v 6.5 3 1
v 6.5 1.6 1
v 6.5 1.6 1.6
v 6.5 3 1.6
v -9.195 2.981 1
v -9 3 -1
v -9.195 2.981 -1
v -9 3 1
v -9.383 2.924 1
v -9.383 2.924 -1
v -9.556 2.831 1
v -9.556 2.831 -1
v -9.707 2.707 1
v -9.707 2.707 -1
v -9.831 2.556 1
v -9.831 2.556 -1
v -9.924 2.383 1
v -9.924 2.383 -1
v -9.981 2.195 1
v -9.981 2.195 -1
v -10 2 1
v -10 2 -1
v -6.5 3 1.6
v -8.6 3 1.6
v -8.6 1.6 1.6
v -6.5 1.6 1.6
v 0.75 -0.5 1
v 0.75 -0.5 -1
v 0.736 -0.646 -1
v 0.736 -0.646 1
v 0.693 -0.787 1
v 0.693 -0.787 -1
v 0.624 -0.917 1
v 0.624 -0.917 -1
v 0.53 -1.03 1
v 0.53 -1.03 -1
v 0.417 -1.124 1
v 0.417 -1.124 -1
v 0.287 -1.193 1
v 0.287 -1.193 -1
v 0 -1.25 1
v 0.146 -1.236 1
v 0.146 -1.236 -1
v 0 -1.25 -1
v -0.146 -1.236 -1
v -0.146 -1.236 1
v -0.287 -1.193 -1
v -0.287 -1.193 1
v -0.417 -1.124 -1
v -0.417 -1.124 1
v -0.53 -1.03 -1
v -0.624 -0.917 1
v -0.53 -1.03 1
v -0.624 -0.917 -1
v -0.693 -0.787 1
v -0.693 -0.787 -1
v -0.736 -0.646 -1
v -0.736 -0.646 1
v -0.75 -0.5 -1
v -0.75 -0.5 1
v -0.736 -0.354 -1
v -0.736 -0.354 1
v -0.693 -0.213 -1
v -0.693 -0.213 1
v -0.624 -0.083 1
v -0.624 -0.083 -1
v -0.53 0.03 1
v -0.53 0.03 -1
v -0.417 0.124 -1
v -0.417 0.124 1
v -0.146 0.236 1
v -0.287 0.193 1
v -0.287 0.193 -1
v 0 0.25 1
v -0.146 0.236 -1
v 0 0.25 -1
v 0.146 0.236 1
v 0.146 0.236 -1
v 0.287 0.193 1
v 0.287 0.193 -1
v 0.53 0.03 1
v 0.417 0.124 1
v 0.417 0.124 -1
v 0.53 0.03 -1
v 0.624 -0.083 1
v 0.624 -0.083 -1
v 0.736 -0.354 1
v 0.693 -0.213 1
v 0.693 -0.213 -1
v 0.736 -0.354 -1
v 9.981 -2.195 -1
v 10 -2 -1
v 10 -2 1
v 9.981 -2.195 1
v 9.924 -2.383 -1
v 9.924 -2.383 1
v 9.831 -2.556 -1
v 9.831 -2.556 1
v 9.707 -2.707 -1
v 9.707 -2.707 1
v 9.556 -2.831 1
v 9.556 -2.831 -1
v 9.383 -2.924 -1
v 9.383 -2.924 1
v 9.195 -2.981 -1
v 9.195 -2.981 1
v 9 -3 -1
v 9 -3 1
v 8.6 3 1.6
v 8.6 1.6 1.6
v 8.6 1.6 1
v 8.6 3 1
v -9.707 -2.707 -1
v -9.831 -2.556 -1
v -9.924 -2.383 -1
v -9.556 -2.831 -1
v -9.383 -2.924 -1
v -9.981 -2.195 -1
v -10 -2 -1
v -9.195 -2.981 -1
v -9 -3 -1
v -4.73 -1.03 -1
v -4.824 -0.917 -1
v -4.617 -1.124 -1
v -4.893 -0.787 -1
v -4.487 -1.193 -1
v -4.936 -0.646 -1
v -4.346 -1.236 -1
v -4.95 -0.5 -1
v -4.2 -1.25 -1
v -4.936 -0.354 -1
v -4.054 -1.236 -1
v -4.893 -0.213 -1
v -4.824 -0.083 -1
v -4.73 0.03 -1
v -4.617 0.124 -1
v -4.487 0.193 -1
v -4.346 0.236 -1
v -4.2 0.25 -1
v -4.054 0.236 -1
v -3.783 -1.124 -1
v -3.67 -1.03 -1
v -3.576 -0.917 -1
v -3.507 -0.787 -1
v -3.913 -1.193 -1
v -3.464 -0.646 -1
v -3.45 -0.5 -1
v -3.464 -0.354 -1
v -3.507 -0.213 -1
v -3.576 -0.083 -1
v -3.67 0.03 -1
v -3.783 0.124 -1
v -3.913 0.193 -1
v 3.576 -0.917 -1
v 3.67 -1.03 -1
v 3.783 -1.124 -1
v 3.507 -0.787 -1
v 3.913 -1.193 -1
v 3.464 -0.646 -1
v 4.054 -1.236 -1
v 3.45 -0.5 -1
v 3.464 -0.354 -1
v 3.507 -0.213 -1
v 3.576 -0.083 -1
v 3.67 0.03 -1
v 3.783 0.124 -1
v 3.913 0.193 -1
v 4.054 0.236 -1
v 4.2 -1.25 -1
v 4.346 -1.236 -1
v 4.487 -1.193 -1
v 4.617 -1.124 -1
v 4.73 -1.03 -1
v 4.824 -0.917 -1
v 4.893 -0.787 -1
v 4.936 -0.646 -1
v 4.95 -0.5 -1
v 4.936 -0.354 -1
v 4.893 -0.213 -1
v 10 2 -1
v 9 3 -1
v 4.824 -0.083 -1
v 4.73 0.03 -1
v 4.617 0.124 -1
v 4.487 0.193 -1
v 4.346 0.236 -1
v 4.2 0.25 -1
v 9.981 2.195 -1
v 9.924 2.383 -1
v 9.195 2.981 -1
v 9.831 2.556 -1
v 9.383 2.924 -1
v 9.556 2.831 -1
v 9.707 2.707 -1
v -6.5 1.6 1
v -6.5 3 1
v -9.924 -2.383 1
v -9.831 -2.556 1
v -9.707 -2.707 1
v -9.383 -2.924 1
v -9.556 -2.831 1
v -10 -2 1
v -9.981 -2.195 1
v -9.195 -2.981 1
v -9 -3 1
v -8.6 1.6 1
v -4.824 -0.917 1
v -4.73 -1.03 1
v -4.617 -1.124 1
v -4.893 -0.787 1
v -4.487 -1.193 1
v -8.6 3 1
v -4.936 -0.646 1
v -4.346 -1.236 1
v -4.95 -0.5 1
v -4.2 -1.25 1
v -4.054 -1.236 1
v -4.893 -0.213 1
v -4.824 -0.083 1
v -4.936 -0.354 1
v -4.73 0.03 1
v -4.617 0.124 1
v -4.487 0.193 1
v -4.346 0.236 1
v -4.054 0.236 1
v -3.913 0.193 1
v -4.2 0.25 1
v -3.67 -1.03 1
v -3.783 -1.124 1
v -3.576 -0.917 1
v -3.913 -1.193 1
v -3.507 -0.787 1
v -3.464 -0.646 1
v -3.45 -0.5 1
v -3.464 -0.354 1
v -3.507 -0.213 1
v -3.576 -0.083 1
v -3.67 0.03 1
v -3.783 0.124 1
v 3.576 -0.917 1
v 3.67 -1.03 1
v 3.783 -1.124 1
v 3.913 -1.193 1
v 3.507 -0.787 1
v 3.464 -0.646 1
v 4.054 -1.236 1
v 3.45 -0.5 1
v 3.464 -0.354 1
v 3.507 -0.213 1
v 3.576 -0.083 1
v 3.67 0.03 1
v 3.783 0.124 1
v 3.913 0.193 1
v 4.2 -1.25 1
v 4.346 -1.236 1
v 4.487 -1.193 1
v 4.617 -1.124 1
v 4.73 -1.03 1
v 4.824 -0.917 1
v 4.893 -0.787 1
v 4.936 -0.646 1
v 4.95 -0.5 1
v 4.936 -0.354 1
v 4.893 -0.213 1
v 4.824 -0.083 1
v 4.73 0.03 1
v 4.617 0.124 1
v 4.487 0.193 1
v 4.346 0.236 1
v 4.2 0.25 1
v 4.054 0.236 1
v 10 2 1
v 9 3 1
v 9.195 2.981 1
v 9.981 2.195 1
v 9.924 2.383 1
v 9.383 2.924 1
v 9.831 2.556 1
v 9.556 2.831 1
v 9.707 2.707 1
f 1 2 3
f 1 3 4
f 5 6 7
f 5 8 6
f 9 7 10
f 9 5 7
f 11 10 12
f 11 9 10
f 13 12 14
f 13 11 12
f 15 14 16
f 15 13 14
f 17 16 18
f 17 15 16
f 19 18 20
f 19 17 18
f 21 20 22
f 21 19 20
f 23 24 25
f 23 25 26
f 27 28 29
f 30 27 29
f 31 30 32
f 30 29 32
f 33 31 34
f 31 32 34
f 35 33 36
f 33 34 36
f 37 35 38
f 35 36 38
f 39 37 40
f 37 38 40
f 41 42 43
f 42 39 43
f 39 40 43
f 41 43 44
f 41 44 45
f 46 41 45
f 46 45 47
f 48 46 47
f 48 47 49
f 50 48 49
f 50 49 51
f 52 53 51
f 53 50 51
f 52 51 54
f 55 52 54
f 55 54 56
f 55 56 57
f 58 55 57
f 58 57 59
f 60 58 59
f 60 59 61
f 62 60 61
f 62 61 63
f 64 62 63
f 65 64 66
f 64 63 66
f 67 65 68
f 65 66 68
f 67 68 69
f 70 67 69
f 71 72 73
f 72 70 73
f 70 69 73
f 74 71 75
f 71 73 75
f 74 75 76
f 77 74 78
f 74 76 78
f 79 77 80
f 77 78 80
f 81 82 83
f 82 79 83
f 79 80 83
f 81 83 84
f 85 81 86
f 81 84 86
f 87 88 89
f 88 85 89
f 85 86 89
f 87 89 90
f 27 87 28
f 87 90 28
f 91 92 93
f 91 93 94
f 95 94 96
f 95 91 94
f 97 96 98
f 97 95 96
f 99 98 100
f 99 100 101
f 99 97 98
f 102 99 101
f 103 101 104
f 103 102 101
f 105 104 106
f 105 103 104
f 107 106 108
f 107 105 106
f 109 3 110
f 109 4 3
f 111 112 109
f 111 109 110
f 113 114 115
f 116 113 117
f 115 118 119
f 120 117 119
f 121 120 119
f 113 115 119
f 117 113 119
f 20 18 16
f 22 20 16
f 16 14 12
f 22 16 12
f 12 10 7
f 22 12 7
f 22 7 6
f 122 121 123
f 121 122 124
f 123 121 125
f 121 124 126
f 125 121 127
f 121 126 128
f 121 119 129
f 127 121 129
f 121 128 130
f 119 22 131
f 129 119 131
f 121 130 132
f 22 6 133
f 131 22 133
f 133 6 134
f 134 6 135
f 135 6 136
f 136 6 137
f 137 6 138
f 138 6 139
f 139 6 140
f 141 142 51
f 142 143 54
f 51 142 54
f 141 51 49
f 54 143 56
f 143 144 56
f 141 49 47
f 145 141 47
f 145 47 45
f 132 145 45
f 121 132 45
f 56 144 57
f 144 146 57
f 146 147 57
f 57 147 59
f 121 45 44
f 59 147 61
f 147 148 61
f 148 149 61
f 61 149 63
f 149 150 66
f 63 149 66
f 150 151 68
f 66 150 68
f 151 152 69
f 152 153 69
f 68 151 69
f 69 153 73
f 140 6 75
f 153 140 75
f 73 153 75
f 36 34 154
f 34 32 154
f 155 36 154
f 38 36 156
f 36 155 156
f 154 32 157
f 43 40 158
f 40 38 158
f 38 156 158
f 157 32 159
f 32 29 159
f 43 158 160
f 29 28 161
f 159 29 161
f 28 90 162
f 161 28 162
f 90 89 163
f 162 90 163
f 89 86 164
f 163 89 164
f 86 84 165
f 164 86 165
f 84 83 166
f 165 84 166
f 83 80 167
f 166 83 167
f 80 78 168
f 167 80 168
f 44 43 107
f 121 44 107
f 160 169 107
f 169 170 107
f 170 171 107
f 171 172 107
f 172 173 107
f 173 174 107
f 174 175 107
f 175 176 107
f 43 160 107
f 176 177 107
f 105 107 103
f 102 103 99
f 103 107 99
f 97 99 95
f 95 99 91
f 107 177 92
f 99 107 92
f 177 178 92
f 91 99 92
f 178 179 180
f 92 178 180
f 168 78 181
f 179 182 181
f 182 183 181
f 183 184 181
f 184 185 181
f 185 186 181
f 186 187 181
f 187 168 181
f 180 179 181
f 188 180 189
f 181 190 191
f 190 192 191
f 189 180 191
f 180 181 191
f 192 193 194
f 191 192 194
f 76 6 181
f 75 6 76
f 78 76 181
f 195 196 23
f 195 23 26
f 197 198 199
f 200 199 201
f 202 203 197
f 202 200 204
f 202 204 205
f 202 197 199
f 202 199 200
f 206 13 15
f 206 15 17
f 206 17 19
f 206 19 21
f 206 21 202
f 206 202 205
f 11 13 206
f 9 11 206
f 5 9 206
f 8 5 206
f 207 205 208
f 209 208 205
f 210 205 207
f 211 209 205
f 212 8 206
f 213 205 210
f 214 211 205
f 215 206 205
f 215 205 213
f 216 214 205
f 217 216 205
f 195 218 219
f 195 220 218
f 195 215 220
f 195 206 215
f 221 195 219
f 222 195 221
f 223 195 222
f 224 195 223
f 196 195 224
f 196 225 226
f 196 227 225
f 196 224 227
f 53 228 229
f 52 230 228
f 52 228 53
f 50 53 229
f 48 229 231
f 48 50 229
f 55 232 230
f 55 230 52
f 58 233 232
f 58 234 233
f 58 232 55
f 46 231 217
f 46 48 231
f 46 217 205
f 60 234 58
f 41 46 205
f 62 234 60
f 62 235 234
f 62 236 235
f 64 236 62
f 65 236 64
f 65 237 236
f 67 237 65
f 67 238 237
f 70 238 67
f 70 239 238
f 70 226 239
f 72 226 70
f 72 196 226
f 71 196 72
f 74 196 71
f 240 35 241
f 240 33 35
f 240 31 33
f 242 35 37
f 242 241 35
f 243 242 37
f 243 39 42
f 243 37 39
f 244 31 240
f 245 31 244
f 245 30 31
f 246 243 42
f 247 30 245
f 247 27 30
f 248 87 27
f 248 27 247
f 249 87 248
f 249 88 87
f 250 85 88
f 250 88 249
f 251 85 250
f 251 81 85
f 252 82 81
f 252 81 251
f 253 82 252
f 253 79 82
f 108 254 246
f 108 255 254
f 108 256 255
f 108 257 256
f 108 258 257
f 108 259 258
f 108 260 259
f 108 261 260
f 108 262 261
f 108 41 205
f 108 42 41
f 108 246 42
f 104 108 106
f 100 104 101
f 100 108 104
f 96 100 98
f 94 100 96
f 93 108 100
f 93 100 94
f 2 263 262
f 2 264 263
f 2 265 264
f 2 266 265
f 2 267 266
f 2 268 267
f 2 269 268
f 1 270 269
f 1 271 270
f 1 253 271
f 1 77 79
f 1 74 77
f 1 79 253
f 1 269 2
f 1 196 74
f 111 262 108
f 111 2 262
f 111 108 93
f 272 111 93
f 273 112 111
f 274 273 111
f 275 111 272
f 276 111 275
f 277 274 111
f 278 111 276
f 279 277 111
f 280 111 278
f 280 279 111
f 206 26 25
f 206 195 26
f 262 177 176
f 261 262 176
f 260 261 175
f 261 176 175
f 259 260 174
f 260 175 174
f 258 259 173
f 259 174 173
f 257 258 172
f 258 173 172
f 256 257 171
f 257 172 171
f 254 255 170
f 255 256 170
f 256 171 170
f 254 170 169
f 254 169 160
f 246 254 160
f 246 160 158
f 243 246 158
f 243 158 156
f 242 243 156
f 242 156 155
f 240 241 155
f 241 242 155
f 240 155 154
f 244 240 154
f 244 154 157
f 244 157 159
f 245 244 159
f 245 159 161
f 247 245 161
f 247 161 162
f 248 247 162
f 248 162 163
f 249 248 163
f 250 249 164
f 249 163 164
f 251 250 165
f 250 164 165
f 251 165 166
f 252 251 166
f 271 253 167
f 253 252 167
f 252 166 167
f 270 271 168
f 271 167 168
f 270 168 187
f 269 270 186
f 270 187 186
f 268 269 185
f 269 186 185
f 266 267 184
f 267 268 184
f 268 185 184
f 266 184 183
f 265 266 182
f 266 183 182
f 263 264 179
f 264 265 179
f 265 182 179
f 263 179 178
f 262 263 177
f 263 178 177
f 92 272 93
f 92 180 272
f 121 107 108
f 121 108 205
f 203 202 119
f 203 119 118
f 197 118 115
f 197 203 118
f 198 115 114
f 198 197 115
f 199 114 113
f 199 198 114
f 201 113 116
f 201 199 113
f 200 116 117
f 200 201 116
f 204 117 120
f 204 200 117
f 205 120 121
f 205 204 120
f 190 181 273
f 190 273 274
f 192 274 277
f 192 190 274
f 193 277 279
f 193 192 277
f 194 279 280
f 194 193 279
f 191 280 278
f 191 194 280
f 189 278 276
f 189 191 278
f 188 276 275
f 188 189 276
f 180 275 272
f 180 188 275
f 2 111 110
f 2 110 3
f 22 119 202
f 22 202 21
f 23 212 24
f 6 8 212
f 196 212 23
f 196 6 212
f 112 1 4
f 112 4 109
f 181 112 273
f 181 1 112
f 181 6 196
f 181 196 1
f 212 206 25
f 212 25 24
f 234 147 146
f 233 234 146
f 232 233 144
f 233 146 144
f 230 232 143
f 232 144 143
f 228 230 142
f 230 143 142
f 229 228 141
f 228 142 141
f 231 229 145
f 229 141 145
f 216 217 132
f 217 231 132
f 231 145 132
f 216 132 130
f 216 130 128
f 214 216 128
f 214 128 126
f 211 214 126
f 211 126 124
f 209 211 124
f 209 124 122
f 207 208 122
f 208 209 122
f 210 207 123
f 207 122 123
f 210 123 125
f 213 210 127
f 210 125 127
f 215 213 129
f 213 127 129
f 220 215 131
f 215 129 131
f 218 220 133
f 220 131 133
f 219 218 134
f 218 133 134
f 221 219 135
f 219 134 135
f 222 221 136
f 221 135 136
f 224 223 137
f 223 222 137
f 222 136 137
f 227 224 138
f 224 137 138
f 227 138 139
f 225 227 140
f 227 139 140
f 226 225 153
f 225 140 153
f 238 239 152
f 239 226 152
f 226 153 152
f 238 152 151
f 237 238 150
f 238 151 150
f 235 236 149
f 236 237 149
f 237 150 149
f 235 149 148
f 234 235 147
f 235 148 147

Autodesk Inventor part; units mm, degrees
ref_plane "YZ Plane" through (0, 0, 0) normal (1, 0, 0) x (0, 1, 0)
ref_plane "XZ Plane" through (0, 0, 0) normal (0, 1, 0) x (-1, 0, 0)
ref_plane "XY Plane" through (0, 0, 0) normal (0, 0, 1) x (1, 0, 0)
sketch "Sketch1" plane through (0, 0, 0) normal (0, 0, 1) x (1, 0, 0)
  line L0 (-10, 3) -> (10, 3)
  line L1 (10, 3) -> (10, -3)
  line L2 (10, -3) -> (-10, -3)
  line L3 (-10, -3) -> (-10, 3)
  circle A0 centre (-4.2, -0.5) radius 0.75
  circle A1 centre (4.2, -0.5) radius 0.75
  circle A2 centre (0, -0.5) radius 0.75
  point P0 (0, 0)
  dimension "d0" = 20
  dimension "d1" = 6
  dimension "d2" = 3
  dimension "d3" = 10
  dimension "d7" = 1.5
  dimension "d8" = 1.5
  dimension "d18" = 2.5
  dimension "d19" = 2.5
  dimension "d20" = 1.5
  dimension "d21" = 2.5
  dimension "d22" = 10
  dimension "d23" = 4.2
  dimension "d24" = 4.2
extrude "Extrusion1" add sketch "Sketch1" along normal mid plane 2
sketch "Sketch2" plane through (0, 0, 1) normal (0, 0, 1) x (1, 0, 0)
  line L0 (10, 3) -> (-10, 3) projected
  line L1 (-8.6, 3) -> (-6.5, 3)
  line L2 (-6.5, 3) -> (-6.5, 1.6)
  line L3 (-6.5, 1.6) -> (-8.6, 1.6)
  line L4 (-8.6, 1.6) -> (-8.6, 3)
  line L5 (6.5, 3) -> (8.6, 3)
  line L6 (8.6, 3) -> (8.6, 1.6)
  line L7 (8.6, 1.6) -> (6.5, 1.6)
  line L8 (6.5, 1.6) -> (6.5, 3)
  line L9 (-10, 3) -> (-10, -3) projected
  line L10 (10, -3) -> (10, 3) projected
  point P0 (0, 0)
  point P1 (-6.5, 2.3)
  dimension "d17" = 1.4
  dimension "d30" = 2.1
  dimension "d31" = 6.5
  dimension "d32" = 6.5
  dimension "d33" = 2.1
extrude "Extrusion2" add sketch "Sketch2" along normal blind 0.6
fillet "Fillet1" radius 1 4 edges at (10, 3, 0) (10, -3, 0) (-10, -3, 0) (-10, 3, 0)
equation "\"d2\" = 0.5 * d1"
equation "\"d3\" = 0.5 * d0"
equation "\"d7\" = d20"
equation "\"d8\" = d20"
equation "\"d19\" = d18"
equation "\"d21\" = d19"
equation "\"d22\" = d3"
equation "\"d24\" = d23"
equation "\"d32\" = d31"
equation "\"d33\" = d30"
properties part number "charger_holder_3DPrint"
